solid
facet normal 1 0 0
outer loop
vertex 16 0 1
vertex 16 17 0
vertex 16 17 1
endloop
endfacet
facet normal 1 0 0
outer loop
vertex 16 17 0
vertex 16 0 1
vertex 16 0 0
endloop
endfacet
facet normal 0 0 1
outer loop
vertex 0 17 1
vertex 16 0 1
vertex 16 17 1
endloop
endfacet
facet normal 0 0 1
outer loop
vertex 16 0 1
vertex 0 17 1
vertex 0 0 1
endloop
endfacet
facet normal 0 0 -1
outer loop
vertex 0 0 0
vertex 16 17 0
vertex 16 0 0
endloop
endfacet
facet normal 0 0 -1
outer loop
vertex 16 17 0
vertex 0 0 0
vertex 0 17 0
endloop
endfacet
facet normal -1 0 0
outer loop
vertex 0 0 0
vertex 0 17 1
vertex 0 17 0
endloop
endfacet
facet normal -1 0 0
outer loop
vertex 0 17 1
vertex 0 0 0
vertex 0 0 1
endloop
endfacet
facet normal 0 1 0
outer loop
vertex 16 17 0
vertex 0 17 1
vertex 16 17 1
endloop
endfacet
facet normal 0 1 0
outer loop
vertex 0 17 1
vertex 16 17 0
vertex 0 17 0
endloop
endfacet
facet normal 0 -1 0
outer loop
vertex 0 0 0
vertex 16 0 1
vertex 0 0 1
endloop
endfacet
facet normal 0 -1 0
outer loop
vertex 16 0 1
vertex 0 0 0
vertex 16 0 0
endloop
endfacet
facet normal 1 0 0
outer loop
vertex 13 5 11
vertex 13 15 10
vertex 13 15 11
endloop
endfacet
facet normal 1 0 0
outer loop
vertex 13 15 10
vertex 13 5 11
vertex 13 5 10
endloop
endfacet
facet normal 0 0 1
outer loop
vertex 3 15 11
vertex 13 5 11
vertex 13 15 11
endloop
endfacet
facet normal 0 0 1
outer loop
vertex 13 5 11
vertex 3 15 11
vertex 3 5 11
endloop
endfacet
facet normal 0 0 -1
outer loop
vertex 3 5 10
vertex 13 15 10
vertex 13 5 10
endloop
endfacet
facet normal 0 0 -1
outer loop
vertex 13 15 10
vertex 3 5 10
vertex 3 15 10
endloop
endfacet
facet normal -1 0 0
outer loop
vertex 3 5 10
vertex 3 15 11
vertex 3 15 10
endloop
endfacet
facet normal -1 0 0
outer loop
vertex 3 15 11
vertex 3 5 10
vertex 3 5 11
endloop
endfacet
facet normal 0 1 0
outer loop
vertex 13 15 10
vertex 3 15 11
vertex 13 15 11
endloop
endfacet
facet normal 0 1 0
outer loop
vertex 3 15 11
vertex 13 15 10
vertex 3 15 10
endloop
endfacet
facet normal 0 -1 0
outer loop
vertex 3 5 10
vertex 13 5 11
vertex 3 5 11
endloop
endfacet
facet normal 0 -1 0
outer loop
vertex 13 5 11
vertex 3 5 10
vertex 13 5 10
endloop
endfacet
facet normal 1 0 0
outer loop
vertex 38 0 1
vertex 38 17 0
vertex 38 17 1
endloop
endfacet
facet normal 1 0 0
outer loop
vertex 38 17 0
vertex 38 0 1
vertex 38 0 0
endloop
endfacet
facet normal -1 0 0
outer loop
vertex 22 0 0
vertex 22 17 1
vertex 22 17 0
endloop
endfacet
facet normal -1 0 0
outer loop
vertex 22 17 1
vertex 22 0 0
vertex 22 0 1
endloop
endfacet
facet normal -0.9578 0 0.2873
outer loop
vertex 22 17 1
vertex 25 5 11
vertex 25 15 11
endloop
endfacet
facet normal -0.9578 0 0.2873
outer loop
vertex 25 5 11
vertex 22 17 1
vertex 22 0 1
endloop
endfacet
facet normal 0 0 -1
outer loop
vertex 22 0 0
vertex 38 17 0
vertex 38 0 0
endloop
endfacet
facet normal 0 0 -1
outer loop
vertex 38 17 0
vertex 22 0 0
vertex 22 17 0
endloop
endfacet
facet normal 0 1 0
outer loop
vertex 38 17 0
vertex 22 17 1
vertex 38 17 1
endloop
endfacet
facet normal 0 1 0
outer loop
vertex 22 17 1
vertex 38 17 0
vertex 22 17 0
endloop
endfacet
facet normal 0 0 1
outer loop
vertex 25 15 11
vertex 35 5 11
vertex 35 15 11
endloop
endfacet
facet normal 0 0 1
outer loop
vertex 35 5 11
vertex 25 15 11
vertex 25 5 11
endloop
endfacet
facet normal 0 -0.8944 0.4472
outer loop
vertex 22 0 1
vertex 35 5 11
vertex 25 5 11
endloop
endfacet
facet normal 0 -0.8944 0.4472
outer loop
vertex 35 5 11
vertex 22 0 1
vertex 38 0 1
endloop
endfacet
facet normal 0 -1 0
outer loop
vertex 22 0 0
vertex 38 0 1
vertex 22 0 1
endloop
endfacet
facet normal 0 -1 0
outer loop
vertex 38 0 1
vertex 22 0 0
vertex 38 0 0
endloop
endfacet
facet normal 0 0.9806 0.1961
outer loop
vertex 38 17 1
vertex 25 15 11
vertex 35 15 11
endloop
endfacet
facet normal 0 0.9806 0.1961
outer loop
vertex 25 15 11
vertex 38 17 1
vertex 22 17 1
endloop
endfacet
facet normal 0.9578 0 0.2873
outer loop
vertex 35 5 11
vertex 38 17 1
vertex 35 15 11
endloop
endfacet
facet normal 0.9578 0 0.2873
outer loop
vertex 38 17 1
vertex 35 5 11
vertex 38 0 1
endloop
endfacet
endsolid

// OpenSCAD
//key hull example

cube([16,17,1]);
translate([3,5,10]) cube([10,10,1]);

translate([22,0,0]){
    hull(){
        cube([16,17,1]);
        translate([3,5,10]) cube([10,10,1]);
    }
}
